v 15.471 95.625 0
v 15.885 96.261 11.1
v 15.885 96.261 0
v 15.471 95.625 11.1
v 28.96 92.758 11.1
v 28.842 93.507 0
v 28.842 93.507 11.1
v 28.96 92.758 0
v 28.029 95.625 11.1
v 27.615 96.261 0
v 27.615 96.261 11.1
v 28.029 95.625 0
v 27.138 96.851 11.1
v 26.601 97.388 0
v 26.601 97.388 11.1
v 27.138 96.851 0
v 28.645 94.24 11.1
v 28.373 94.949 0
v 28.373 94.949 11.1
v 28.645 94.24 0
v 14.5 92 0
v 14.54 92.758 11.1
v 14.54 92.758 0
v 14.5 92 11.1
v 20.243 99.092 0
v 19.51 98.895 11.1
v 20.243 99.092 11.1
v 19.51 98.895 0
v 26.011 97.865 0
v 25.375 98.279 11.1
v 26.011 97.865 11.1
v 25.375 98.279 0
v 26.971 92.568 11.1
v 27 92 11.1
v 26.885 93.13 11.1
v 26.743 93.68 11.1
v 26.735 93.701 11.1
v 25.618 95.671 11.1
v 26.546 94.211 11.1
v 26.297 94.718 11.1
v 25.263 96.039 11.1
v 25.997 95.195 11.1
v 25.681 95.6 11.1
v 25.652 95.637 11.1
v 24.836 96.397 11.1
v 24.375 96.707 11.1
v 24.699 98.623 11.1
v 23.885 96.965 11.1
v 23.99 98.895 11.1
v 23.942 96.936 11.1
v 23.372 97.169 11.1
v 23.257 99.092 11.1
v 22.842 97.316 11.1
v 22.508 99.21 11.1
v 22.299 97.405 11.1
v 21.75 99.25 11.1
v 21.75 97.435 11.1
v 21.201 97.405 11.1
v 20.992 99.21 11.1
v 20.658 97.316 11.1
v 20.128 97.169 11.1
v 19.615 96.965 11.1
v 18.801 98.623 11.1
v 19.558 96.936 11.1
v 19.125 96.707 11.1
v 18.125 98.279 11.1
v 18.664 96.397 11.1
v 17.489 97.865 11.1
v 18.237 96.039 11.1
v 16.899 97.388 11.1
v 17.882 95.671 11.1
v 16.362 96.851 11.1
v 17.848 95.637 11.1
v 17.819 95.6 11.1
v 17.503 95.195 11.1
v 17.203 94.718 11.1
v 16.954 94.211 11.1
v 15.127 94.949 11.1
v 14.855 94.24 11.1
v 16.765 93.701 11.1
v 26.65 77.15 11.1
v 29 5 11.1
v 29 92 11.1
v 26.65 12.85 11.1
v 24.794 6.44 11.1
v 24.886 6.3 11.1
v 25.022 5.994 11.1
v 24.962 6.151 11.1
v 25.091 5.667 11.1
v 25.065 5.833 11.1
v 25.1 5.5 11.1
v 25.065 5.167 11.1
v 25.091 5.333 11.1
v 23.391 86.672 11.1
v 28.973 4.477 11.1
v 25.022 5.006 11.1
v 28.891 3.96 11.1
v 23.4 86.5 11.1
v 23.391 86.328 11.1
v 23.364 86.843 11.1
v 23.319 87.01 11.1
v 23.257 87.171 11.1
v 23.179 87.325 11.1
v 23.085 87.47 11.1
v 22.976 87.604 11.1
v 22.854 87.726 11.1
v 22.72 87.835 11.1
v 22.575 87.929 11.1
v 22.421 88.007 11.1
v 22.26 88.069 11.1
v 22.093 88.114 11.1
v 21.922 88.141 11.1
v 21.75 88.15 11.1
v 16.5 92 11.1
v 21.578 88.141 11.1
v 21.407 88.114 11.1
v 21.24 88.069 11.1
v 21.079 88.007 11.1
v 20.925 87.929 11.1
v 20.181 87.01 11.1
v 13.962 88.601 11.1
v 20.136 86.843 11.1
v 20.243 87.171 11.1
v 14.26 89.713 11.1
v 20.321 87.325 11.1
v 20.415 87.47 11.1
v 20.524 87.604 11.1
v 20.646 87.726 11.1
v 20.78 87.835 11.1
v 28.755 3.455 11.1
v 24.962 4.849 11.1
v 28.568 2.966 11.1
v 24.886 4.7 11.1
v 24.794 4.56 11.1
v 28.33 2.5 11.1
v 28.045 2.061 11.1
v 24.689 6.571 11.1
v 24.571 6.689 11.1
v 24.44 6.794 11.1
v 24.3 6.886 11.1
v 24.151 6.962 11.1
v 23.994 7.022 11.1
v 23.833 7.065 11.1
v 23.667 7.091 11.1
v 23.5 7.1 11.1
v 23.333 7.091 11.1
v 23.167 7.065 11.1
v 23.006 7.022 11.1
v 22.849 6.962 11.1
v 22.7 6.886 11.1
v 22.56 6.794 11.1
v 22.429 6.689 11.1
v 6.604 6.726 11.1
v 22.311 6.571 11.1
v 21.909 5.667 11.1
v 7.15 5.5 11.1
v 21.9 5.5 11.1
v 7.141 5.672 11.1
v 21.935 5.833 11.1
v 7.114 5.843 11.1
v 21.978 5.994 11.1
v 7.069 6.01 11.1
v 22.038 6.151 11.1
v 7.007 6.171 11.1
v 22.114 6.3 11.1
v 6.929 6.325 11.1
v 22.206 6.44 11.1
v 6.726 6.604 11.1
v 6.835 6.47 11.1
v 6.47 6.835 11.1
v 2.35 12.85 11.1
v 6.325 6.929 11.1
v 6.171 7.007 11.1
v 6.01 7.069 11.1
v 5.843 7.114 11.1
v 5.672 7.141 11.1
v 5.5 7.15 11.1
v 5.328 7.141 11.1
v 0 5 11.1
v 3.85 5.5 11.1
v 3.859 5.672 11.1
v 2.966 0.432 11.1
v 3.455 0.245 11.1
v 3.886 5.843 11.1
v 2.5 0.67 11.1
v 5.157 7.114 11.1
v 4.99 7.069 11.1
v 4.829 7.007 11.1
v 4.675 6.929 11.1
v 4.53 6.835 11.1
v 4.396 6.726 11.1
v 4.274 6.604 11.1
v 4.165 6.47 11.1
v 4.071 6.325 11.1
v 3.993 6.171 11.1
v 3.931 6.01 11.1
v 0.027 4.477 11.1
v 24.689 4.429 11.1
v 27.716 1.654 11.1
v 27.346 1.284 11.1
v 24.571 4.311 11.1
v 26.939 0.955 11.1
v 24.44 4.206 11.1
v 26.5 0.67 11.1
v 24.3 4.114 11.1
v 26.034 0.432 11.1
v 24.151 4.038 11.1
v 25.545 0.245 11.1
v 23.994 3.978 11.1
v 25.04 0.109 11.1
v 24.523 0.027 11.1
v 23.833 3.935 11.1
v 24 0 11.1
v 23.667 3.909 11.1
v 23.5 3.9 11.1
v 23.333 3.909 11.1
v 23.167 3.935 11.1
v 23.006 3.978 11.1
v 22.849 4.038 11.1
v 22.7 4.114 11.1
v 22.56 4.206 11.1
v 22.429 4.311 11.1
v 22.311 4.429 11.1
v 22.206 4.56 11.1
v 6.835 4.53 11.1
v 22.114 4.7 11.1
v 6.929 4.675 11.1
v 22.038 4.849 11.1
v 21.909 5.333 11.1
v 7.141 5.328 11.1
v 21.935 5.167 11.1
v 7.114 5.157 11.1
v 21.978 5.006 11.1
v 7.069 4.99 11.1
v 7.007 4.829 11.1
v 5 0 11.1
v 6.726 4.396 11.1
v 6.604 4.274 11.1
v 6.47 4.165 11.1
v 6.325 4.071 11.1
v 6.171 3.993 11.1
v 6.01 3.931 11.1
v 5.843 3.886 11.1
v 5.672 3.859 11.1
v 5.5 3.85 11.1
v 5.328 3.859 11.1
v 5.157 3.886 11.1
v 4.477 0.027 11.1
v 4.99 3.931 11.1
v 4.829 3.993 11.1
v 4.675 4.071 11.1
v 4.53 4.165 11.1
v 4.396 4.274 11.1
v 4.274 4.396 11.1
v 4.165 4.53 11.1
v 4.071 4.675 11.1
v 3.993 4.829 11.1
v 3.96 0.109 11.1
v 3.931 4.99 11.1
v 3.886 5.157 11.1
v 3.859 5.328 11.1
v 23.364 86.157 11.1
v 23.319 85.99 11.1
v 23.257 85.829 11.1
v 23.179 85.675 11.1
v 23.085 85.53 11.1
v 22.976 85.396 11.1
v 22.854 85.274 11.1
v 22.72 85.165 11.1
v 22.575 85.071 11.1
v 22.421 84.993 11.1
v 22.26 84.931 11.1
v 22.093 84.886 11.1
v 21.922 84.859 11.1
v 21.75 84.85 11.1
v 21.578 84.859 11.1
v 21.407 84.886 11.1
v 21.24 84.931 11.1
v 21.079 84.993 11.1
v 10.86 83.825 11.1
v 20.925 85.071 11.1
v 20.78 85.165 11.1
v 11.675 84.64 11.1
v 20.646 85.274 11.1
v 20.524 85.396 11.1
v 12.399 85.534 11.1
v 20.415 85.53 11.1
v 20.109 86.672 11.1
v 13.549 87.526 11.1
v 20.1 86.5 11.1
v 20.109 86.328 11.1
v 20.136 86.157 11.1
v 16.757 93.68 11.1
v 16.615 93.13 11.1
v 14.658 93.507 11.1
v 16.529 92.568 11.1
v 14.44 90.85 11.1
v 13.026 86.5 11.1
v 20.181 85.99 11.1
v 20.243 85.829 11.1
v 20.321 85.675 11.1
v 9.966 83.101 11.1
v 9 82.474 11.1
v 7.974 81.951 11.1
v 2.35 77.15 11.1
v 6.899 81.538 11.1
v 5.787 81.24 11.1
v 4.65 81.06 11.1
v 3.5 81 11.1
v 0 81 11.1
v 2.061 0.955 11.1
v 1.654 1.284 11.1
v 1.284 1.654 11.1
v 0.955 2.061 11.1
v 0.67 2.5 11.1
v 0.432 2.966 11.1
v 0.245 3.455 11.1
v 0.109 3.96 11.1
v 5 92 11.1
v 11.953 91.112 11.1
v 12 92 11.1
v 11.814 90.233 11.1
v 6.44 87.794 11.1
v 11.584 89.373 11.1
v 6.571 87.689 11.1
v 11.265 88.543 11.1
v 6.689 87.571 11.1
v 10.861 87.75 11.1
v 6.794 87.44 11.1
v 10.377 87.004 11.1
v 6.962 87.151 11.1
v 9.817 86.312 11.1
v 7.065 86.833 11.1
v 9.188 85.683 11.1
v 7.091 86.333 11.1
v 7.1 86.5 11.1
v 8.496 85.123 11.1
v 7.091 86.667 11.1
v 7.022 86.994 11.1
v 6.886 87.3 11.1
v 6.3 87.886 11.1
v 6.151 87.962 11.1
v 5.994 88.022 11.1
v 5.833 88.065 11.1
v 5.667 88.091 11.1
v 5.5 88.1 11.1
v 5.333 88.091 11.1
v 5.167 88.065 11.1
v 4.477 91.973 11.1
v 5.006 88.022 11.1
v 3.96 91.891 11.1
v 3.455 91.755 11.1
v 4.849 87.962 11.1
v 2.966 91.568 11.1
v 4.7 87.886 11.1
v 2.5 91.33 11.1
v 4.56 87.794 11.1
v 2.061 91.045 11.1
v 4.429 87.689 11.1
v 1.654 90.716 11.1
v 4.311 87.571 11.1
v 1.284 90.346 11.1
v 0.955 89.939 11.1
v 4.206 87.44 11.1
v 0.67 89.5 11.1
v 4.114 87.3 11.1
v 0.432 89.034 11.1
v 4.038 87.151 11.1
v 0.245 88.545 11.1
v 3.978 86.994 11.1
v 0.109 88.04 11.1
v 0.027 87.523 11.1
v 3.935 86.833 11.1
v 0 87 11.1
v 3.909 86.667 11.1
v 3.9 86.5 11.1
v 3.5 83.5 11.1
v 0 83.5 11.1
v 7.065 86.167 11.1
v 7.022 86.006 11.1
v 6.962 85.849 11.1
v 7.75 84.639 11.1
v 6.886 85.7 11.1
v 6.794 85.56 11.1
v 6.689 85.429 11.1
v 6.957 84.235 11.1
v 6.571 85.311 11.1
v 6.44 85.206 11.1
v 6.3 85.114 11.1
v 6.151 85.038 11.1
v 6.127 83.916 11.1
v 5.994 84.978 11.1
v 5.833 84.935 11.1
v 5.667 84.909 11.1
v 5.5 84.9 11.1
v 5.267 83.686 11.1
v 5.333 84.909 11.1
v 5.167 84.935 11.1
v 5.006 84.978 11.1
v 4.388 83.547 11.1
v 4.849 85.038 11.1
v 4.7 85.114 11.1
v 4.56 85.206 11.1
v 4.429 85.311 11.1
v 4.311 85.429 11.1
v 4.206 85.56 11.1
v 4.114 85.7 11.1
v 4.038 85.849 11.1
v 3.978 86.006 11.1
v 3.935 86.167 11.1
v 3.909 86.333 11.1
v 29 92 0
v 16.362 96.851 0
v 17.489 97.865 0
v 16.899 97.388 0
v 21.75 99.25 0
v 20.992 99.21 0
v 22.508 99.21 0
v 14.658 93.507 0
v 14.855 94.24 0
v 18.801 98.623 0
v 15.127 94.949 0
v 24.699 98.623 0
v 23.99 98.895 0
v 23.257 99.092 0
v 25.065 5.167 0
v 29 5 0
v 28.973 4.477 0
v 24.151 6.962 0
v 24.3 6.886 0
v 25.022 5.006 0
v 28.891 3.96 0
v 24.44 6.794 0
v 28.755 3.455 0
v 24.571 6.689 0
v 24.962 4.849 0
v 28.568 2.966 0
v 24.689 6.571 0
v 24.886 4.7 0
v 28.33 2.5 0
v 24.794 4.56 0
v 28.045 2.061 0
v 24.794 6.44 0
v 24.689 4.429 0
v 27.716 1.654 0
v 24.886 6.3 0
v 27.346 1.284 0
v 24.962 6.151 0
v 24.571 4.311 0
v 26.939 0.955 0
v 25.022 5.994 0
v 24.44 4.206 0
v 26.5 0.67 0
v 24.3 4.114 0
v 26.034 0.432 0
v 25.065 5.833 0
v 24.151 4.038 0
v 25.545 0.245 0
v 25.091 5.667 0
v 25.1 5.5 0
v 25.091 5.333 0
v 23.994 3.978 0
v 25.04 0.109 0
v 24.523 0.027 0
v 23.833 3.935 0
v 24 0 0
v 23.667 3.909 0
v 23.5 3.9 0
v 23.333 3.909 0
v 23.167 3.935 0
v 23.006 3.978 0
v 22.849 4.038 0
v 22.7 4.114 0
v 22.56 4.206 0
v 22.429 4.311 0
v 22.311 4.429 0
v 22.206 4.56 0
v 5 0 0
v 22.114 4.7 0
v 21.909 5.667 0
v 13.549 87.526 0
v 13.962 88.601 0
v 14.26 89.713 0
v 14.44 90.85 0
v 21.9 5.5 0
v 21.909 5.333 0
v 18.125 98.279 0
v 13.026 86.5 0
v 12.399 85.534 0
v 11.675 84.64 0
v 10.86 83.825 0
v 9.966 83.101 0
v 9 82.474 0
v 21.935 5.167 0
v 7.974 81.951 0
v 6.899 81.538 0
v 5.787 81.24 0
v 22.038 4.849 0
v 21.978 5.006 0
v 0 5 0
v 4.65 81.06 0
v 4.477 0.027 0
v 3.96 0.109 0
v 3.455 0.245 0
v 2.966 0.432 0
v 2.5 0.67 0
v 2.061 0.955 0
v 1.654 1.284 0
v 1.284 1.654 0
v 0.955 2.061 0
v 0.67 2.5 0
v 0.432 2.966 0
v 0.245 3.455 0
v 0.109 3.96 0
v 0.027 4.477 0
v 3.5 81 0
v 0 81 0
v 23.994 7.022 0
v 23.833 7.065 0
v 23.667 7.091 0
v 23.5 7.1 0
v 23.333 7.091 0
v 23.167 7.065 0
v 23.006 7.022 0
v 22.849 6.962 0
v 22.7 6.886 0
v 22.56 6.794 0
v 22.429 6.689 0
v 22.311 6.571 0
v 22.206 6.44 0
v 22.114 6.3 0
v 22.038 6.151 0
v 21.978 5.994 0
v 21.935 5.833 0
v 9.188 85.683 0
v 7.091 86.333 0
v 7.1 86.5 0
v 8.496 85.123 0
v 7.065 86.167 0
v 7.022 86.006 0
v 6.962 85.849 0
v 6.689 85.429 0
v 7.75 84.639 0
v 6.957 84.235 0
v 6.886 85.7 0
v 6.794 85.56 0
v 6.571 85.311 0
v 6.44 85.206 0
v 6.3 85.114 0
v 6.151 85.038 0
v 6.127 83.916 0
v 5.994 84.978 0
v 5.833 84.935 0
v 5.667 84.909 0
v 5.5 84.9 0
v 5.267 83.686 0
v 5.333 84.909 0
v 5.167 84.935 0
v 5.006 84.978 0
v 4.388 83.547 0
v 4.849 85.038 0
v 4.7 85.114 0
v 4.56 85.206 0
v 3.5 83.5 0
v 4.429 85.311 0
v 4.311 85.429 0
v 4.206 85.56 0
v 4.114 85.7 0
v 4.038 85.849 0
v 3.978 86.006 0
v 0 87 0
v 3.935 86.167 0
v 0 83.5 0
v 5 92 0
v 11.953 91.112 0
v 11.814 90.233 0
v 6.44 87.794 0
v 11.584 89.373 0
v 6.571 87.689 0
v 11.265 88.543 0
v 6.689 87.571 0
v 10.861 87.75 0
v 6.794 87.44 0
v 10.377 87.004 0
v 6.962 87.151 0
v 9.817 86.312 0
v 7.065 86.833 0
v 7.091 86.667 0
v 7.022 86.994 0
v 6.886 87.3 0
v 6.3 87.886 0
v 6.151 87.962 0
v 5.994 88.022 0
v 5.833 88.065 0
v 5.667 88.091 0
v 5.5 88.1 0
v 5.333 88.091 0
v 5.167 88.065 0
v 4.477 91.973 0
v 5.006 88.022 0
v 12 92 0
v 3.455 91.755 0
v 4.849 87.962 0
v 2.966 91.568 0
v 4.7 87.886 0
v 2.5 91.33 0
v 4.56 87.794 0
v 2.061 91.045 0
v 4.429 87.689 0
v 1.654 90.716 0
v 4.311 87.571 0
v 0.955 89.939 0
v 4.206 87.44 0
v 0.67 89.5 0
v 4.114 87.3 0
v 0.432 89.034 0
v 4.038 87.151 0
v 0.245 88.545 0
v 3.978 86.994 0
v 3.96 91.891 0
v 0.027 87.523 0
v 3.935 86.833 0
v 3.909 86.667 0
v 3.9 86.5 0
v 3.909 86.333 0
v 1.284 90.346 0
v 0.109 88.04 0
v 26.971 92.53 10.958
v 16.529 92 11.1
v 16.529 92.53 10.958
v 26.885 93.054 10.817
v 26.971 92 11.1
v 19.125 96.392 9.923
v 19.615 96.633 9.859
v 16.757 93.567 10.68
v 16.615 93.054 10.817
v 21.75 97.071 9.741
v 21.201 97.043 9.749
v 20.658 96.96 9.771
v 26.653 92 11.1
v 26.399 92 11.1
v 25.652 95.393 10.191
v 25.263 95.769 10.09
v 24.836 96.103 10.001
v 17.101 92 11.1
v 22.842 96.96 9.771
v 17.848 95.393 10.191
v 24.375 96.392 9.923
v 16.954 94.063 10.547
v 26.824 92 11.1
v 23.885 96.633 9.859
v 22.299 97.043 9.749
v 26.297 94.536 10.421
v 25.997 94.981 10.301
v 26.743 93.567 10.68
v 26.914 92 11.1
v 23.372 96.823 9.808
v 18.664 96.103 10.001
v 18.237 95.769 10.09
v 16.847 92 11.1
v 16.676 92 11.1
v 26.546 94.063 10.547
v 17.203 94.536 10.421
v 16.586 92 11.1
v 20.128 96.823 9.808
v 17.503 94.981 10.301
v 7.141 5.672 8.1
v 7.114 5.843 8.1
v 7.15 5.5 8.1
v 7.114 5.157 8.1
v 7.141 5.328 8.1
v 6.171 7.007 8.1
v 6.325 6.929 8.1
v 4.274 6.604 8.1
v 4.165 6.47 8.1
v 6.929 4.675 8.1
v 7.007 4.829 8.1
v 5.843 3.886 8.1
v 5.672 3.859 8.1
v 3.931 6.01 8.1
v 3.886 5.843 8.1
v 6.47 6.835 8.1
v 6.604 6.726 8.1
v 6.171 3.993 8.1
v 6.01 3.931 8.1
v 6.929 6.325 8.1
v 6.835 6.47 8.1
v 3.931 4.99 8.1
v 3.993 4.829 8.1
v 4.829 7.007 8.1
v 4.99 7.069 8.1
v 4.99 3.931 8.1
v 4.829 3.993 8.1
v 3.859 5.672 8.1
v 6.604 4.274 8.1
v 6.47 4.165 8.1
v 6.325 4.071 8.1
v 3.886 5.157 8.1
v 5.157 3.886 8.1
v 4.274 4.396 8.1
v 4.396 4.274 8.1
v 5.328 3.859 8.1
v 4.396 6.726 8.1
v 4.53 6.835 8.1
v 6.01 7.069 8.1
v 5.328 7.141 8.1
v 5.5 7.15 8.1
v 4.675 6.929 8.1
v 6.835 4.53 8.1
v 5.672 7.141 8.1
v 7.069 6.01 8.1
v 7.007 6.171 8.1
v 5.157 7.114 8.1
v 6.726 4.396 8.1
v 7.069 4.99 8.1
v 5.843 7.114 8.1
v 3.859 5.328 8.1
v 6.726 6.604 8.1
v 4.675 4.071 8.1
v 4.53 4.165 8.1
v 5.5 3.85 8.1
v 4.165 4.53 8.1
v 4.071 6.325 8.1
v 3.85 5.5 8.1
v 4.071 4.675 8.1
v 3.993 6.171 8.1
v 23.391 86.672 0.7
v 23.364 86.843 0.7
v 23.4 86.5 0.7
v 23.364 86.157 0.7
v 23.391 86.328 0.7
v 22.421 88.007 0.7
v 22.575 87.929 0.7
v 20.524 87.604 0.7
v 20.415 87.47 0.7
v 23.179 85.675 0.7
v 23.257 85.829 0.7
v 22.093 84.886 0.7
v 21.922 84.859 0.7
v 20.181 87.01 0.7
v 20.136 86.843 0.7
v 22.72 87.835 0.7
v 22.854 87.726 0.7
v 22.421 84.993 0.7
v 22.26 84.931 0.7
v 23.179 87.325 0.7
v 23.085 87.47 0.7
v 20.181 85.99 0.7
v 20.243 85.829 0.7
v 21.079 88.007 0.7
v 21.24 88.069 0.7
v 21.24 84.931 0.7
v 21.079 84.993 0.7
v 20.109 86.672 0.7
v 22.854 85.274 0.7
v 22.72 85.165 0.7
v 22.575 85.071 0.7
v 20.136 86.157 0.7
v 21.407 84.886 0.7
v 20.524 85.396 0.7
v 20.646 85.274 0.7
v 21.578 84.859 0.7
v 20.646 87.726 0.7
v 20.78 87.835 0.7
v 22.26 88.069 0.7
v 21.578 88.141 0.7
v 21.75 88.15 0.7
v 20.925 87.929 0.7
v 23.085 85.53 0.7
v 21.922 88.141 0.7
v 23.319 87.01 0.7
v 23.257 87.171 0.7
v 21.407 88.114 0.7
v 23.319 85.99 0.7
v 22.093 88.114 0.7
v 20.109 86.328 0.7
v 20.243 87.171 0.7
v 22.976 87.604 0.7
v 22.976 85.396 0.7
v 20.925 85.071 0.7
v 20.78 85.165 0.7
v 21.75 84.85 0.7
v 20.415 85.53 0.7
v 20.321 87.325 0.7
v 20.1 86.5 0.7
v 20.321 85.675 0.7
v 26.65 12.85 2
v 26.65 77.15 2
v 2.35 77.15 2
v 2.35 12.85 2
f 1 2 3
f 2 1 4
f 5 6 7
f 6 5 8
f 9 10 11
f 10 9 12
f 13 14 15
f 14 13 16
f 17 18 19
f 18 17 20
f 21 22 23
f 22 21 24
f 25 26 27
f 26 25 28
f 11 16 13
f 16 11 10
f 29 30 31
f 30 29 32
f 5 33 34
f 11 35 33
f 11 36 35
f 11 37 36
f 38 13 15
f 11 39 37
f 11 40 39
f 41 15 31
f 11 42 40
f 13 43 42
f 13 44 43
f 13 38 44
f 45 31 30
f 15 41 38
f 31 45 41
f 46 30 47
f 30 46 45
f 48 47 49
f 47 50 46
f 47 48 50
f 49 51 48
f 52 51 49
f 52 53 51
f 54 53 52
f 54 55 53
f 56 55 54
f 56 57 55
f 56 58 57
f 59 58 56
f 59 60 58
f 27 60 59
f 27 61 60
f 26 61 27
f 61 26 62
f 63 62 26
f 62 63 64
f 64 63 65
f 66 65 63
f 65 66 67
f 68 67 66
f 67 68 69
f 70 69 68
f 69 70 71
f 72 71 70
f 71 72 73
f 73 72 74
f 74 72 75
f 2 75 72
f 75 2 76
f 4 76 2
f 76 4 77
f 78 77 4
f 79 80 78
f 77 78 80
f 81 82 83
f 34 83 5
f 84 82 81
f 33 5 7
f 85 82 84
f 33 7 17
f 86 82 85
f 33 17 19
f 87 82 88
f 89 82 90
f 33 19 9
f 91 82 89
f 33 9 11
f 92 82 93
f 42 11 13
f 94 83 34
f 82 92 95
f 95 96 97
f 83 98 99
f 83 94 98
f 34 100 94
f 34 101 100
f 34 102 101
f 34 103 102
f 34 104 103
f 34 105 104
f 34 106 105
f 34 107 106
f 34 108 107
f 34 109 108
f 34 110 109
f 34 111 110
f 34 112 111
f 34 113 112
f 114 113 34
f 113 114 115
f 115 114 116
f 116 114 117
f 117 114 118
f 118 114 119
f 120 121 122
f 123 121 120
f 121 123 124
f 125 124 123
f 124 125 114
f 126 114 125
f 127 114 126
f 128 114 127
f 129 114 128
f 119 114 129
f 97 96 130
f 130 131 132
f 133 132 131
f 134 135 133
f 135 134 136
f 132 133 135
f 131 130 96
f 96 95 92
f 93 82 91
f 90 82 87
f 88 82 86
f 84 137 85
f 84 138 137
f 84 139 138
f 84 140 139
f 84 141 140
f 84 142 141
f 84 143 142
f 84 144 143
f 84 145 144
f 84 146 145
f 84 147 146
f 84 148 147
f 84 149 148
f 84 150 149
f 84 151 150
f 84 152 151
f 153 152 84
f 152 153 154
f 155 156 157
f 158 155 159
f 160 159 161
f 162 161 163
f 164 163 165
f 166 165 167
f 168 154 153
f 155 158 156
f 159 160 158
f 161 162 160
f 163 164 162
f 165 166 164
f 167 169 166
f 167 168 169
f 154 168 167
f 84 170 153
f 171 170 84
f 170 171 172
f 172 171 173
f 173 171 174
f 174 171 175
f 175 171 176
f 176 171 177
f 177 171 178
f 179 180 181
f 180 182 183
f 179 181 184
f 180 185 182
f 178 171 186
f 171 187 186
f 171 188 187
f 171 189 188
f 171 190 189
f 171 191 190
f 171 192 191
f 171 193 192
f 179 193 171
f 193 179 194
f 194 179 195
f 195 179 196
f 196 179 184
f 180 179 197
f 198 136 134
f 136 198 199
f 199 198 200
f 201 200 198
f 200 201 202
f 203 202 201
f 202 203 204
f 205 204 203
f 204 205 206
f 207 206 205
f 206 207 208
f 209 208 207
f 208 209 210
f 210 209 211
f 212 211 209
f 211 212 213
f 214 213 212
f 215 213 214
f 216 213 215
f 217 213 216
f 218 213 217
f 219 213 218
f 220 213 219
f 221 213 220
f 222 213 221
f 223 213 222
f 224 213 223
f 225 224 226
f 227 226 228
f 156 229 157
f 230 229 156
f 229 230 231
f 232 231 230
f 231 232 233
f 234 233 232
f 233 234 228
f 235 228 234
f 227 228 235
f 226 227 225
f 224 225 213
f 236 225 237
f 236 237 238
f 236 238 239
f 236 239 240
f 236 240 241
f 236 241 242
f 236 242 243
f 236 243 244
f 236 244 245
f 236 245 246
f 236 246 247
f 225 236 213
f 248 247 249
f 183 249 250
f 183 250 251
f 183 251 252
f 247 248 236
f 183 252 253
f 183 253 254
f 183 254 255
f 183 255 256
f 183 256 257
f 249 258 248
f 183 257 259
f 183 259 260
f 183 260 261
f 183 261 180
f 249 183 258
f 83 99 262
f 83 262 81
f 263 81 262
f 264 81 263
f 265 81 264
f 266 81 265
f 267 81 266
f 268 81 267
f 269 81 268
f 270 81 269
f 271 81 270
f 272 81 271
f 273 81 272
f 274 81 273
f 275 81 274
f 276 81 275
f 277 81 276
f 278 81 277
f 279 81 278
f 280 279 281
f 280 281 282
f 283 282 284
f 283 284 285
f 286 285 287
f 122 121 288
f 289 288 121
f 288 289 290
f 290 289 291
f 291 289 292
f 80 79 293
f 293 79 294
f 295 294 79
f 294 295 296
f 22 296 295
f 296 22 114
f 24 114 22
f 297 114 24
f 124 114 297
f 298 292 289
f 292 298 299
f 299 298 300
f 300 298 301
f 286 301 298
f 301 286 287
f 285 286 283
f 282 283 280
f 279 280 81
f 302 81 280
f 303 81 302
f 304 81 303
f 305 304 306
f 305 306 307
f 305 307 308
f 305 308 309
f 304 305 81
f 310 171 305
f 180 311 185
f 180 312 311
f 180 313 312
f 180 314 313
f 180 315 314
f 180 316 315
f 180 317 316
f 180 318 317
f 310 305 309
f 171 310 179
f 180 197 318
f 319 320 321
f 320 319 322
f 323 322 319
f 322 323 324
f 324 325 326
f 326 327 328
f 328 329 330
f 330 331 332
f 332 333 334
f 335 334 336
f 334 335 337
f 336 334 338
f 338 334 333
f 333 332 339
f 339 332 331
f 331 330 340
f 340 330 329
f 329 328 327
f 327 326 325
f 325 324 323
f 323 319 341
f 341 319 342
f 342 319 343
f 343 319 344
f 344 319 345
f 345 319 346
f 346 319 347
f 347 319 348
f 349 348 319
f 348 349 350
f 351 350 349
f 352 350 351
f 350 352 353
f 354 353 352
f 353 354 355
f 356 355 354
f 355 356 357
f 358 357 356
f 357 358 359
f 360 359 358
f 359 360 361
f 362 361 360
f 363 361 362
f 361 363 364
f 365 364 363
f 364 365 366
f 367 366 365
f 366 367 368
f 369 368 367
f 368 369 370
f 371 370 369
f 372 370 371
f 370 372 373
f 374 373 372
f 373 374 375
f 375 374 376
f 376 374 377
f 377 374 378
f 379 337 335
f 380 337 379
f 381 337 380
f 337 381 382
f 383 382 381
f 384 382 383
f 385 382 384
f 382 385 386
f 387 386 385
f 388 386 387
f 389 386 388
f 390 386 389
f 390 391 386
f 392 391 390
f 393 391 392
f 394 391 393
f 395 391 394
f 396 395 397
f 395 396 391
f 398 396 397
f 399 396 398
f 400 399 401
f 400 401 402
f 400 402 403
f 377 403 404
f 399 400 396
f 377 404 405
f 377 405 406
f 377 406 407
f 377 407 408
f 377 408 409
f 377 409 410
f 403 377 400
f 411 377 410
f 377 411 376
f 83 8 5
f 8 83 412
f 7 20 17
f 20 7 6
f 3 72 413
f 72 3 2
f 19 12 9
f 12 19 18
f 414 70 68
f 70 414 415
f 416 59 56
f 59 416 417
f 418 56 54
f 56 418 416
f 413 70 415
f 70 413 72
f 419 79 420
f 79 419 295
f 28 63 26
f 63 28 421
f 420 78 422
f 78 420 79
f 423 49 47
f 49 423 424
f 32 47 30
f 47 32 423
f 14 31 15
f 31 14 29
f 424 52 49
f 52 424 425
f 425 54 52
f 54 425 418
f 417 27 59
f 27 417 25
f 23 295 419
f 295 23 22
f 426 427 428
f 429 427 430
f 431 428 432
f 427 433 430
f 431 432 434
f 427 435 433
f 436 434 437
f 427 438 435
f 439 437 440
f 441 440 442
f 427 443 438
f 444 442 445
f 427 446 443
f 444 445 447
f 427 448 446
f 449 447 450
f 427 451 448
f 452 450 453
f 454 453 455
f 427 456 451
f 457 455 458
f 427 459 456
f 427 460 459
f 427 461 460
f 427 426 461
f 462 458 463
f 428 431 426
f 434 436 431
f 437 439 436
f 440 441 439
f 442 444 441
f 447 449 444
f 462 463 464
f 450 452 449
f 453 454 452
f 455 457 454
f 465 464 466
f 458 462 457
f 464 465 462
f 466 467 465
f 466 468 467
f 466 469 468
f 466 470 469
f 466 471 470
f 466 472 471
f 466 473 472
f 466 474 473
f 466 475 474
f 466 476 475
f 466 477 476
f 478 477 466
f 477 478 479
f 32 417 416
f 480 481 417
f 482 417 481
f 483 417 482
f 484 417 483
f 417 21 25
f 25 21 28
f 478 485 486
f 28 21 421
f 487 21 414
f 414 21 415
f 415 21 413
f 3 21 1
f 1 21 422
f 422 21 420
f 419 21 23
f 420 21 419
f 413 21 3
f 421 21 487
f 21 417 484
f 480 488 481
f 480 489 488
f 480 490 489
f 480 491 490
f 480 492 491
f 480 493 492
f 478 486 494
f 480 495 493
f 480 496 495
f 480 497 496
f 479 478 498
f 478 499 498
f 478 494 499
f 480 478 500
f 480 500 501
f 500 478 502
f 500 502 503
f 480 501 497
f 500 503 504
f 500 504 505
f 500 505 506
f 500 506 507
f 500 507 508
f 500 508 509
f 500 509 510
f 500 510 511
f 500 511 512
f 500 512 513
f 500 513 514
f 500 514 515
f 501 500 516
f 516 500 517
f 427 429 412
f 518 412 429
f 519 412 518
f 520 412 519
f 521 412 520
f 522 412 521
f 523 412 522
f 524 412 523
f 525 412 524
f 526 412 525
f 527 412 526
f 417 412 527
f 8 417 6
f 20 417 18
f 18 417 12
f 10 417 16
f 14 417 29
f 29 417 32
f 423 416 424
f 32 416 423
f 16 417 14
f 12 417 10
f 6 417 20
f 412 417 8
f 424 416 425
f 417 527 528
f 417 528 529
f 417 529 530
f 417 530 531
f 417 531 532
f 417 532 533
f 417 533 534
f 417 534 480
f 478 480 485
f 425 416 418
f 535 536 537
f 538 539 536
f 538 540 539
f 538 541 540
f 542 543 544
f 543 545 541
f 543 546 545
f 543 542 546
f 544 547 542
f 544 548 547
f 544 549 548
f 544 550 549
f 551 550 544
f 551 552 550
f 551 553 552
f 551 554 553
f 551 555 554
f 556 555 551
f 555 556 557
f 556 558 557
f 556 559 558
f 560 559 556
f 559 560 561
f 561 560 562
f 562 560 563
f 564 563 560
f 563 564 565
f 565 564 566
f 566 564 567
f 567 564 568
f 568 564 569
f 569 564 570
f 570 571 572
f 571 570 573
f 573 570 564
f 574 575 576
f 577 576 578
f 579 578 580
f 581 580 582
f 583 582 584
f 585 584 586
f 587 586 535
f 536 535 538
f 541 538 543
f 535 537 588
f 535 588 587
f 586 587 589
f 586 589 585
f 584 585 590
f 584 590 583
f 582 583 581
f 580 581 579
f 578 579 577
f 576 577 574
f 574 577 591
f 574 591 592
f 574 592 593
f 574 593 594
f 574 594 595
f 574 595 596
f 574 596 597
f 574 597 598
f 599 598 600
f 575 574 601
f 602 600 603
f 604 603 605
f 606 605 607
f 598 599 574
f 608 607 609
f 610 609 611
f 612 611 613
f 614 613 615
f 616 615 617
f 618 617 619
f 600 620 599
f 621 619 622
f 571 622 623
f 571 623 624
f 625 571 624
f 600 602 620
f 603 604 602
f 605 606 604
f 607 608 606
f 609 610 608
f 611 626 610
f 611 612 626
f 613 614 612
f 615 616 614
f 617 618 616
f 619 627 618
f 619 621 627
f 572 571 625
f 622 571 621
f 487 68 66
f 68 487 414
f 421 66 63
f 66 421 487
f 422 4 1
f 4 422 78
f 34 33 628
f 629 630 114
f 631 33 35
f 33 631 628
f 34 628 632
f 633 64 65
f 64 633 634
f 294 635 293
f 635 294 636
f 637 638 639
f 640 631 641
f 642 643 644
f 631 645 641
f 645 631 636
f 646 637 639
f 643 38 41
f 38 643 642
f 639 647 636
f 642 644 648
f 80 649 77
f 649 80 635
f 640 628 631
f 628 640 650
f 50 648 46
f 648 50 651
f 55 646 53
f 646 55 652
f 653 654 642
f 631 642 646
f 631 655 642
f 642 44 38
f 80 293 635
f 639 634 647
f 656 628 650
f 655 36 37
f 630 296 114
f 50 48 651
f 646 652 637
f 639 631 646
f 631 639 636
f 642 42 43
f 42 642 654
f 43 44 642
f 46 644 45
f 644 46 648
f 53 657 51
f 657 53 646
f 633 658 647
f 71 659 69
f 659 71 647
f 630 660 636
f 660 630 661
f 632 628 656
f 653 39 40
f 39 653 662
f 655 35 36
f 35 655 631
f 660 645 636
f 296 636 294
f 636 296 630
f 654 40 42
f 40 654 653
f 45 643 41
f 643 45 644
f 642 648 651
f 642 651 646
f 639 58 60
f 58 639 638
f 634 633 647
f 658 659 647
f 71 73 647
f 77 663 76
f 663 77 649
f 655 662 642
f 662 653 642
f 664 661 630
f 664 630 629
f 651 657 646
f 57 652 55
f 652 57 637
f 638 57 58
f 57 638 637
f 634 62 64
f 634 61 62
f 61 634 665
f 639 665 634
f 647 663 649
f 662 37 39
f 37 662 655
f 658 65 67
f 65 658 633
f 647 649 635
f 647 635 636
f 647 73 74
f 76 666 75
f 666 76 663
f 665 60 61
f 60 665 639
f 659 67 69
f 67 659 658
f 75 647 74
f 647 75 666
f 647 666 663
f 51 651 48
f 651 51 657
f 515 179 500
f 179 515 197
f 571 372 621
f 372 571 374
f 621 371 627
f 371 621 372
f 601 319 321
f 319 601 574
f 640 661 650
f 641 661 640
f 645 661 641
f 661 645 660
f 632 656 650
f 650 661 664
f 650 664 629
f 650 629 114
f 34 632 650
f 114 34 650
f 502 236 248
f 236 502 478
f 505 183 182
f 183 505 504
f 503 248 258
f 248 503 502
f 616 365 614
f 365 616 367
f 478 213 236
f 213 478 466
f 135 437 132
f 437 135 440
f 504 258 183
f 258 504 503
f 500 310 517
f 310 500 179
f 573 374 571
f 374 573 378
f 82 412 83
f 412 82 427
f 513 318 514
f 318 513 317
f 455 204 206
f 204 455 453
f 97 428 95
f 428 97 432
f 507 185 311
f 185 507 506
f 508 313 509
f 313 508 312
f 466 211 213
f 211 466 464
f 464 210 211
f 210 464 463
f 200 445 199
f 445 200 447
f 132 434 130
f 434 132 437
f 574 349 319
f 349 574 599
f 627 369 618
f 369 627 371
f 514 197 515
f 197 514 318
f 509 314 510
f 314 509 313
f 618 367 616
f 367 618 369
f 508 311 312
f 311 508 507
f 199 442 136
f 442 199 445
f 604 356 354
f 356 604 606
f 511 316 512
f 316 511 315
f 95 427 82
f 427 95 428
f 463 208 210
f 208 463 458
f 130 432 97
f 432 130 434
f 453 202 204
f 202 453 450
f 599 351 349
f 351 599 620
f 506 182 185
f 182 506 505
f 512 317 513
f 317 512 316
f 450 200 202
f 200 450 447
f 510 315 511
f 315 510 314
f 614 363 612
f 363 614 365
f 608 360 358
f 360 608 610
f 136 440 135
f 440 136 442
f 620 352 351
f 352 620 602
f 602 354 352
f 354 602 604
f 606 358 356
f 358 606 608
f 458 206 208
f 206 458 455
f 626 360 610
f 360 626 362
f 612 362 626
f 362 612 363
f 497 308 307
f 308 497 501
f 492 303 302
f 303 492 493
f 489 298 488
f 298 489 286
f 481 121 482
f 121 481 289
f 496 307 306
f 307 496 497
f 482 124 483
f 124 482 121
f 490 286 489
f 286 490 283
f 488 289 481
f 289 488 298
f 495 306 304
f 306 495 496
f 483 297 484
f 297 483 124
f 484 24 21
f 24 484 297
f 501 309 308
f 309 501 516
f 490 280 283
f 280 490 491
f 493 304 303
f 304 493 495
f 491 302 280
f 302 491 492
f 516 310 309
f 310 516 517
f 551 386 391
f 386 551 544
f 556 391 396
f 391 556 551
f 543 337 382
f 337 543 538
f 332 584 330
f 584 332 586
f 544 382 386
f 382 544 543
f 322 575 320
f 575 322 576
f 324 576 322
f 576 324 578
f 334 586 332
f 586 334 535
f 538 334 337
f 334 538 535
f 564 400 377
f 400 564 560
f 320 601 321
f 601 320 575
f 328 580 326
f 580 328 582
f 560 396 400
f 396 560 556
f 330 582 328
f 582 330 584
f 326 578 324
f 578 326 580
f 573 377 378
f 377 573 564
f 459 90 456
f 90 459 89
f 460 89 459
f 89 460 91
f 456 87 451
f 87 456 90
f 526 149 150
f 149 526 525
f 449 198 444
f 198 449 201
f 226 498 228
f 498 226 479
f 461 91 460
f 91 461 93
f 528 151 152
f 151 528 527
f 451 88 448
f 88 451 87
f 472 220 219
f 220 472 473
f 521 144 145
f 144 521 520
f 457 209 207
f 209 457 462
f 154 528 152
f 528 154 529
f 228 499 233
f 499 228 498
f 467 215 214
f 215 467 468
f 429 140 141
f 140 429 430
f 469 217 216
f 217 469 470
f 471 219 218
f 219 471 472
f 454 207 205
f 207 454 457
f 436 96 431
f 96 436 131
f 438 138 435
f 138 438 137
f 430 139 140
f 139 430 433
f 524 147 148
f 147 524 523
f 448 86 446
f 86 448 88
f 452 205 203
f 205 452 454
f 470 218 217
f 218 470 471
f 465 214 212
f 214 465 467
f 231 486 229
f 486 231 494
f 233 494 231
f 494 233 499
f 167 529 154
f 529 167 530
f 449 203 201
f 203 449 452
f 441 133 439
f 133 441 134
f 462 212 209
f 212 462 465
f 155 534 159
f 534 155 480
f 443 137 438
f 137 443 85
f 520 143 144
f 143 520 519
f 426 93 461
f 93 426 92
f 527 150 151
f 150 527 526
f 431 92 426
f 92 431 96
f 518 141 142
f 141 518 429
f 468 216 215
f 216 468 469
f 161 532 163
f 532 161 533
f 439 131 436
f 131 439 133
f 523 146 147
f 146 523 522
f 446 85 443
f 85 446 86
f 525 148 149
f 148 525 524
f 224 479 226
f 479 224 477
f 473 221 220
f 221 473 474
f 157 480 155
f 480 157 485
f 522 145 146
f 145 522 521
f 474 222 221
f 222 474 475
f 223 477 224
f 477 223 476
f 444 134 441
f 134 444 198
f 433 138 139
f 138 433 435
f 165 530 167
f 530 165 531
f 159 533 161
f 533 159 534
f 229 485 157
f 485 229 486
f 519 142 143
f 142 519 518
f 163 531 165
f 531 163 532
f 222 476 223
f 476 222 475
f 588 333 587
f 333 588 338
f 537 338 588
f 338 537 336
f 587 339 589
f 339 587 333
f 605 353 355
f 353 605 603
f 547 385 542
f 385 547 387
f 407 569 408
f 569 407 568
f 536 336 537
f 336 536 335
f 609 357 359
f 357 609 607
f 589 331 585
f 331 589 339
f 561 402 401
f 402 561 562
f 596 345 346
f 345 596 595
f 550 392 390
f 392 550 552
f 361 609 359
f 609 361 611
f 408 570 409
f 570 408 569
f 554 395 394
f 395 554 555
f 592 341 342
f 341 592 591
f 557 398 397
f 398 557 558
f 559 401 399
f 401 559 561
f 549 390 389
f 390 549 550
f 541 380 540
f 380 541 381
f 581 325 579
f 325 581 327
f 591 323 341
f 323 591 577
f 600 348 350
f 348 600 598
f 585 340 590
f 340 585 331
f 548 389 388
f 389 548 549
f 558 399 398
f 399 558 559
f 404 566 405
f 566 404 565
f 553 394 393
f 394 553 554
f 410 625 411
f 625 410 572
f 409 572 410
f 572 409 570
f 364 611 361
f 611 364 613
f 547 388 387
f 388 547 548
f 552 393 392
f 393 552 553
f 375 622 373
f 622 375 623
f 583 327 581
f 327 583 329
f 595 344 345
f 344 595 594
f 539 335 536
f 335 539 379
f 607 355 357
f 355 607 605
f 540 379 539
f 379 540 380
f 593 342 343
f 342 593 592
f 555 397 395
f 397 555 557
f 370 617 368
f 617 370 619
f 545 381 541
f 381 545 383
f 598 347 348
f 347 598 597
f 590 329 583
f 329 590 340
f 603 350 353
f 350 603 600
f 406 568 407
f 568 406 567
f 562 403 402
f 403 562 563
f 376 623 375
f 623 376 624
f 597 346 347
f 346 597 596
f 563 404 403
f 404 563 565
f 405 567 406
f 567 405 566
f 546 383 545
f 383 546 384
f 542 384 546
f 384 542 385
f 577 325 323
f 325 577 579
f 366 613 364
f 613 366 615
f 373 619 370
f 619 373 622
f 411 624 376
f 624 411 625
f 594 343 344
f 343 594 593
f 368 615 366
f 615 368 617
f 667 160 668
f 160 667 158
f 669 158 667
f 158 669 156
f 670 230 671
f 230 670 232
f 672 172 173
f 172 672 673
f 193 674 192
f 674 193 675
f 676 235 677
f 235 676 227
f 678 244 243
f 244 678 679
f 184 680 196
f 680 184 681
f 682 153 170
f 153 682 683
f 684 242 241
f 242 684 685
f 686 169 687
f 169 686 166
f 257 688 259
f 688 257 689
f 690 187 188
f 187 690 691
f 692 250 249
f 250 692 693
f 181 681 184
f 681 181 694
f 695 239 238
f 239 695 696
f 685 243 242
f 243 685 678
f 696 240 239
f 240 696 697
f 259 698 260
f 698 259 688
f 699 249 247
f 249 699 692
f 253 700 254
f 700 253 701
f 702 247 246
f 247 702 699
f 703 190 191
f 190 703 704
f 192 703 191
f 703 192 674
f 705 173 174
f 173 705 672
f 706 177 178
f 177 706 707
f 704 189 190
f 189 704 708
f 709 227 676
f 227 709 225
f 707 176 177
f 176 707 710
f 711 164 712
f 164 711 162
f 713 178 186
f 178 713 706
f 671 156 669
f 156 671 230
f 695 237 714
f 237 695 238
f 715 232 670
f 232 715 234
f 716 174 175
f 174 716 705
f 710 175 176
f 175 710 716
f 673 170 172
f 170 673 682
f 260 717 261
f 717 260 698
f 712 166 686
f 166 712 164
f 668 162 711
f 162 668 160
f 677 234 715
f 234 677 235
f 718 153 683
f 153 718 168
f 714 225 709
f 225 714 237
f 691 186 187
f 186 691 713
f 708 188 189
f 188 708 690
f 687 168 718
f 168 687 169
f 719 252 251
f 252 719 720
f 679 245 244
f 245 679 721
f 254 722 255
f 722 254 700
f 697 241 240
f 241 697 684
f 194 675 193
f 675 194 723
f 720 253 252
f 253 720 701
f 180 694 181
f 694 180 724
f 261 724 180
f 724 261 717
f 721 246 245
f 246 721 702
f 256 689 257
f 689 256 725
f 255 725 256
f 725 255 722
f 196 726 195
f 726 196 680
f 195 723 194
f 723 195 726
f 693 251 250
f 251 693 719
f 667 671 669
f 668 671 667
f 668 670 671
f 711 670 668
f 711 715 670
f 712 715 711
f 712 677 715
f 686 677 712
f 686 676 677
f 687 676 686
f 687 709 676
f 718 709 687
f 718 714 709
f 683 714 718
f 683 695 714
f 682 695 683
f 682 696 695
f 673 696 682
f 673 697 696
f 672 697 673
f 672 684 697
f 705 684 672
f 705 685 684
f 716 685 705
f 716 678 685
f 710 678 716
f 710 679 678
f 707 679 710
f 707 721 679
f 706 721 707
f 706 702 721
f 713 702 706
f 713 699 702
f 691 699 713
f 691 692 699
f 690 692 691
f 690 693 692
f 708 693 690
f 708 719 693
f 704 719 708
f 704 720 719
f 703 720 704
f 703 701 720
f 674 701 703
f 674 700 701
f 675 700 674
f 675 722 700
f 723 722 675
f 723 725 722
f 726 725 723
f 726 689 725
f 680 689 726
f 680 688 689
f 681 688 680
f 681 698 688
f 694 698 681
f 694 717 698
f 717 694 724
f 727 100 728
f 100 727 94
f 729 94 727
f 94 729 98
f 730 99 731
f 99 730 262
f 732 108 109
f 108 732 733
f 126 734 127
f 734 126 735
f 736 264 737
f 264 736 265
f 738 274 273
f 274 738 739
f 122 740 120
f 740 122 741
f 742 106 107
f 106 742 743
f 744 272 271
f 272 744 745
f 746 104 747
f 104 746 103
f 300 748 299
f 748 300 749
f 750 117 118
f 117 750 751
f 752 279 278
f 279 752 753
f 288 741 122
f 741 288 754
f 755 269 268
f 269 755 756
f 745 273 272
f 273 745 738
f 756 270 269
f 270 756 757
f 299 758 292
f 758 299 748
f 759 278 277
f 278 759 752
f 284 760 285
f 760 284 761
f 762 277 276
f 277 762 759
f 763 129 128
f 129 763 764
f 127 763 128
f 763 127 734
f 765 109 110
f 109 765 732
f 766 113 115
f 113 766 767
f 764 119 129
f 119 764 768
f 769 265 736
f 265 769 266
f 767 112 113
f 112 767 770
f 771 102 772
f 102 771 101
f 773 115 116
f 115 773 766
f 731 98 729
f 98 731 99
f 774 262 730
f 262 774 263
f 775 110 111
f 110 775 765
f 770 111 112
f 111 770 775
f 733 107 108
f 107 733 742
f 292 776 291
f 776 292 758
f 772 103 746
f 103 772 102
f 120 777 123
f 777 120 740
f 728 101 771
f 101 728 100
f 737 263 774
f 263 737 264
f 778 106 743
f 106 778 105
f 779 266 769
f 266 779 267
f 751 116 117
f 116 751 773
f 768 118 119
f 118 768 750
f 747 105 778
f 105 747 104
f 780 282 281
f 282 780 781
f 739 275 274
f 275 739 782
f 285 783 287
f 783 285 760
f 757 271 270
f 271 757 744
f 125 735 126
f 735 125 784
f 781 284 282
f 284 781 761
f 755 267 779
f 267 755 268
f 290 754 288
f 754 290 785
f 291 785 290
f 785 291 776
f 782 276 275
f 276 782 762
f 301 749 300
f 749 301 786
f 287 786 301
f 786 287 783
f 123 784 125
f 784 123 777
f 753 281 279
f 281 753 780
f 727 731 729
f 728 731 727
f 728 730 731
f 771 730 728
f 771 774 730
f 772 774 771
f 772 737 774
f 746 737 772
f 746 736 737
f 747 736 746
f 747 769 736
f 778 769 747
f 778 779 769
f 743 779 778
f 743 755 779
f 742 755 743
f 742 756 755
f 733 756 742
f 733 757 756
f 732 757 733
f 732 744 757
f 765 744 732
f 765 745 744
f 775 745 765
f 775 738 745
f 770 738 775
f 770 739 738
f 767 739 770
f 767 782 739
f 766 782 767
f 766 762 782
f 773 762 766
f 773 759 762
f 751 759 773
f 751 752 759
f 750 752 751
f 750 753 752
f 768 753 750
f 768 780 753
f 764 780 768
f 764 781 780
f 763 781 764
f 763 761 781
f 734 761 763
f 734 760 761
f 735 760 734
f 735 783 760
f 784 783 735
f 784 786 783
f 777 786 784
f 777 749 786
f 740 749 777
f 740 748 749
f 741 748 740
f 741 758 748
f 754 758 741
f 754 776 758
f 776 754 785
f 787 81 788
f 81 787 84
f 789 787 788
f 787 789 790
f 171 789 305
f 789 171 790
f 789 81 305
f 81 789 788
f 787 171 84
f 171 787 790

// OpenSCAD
//SD/microSD pocket customizable (army knife style)
//by Yannis Kari
//ToDo: add minisd slot


//use <text_on/text_on.scad>

part = 2; // [1:top, 2:holder, 3:bottom]

ext_radius = 5;
size_x = 29;
size_y = 92;
hole_dia = 3.2;
magnet_dia = 3.3;
magnet_height = 1;
magnets = 3;
layers = 3; // layers below magnets 1...10
layer_height = 0.2;
first_layer_height = 0.3;
offset_x = 0.3;
offset_y = 0.3;

slot1 = 1; // [1:SD, 2:4x microSD]
slot2 = 2; // [1:SD, 2:4x microSD]
finger_push = 0; // [1:Yes, 0:No]
finger_pull = 1; // [1:Yes, 0:No]
spacer = 1; // [1:Yes, 0:No]

//Hidden
$fn = 60;
//Calc
magnet_h = magnets * magnet_height;
size_z = (magnet_h + first_layer_height + (layers-1)*layer_height)*3;

module SD(){
	translate([-offset_x/2,-offset_y/2,2])
    cube([24+offset_x,64+offset_y,size_z]);
    //cube([25,25,30]);
	if (finger_push == 1) translate([24/2,32/2,-size_z+2.5-0.1])cylinder(d=19,h=size_z-2.5+0.2);
}

module base(thick){
	hull(){
		translate([ext_radius,ext_radius,0])cylinder(d=ext_radius*2,h=thick);
		translate([ext_radius,size_y-ext_radius,0])cylinder(d=ext_radius*2,h=thick);
		translate([size_x-ext_radius,size_y-ext_radius,0])cylinder(d=ext_radius*2,h=thick);
		translate([size_x-ext_radius,ext_radius,0])cylinder(d=ext_radius*2,h=thick);
	}
}

module screw_holes(thick){
	translate([size_x-5.5,5.5,-0.1])cylinder(d=hole_dia,h=thick+0.2);
	translate([5.5,size_y-5.5,-0.1])cylinder(d=hole_dia,h=thick+0.2);
}

module screw_heads(thick){
	translate([size_x-5.5,5.5,thick-3])cylinder(d=5.7,h=3+0.1);
	translate([5.5,size_y-5.5,thick-3])cylinder(d=5.7,h=3+0.1);
}

module magnet_holes(thick){
	translate([5.5,5.5,size_z-magnet_h])cylinder(d=magnet_dia,h=magnet_h+0.1);
	translate([29-29/4,size_y-5.5,0.7])cylinder(d=magnet_dia,h=thick-0.7+0.1);
}

module nut_grooves(thick){
	translate([size_x-5.5,5.5,-0.1])rotate([0,0,45])cylinder(d=6.8,h=2.5+.1,$fn=6);
	translate([5.5,size_y-5.5,-0.1])rotate([0,0,45])cylinder(d=6.8,h=2.5+0.1,$fn=6);
}

module print_part(type){
	difference(){
		union(){
			if(type == 2){
				base(size_z);
				translate([size_x-ext_radius,size_y-ext_radius])cube([ext_radius,ext_radius,size_z]);
				difference(){
					translate([size_x-size_x/4,size_y,0])cylinder(d=29/2,h=size_z);
					if (finger_pull) translate([size_x-size_x/4,size_y,size_z])rotate([-15,0,0])cylinder(d=29/2-4,h=size_z);
				}
			}
			else base(size_z);
		}
		if (type == 2){
			if (slot1 == 1)
                translate([2.5,13,0])
                SD();
			//else if (slot1 == 2) translate([2.5,13,size_z-2.5]) SD();
			//if (slot2 == 1) translate([2.5,47,2.5]) SD();
			//else if (slot2 == 2) translate([2.5,47,2.5]) SD();

			difference(){
				union(){
					translate([size_x/2-22/2,size_y,-0.1])cylinder(d=22,h=size_z+0.2);
					translate([-0.1,size_y-11,-0.1])cube([size_x/2-11+0.1,11,size_z+0.2]);
				}
				if (spacer){
					translate([size_x/2-22/2,size_y,-0.1])cylinder(d=17,h=size_z+0.2);
					translate([-0.1,size_y-8.5,-0.1])cube([size_x/2-11+0.1,8.5,size_z+0.2]);
				}
			}
            
			screw_holes(size_z);
			magnet_holes(size_z);
		}
		else{
			screw_holes(size_z);
			magnet_holes(size_z);
			if (type == 1){
				screw_heads(size_z);
				translate([size_x/2,size_y/2,size_z-0.2/2])rotate([0,0,90])text_extrude("Memory Cards",extrusion_height=0.4+0.1,size=6,font="Spin Cycle OT",center=true);
			}
			else{
				nut_grooves();
				translate([size_x/2,size_y/2,0.2/2])rotate([180,0,90])text_extrude("HackerMagnet",extrusion_height=0.4+0.1,size=6,font="Spin Cycle OT",center=true);
			}
		}
	}
}

if (part == 3) translate([size_x,0,size_z])rotate([0,180,0]) print_part(part);
else print_part(part);
